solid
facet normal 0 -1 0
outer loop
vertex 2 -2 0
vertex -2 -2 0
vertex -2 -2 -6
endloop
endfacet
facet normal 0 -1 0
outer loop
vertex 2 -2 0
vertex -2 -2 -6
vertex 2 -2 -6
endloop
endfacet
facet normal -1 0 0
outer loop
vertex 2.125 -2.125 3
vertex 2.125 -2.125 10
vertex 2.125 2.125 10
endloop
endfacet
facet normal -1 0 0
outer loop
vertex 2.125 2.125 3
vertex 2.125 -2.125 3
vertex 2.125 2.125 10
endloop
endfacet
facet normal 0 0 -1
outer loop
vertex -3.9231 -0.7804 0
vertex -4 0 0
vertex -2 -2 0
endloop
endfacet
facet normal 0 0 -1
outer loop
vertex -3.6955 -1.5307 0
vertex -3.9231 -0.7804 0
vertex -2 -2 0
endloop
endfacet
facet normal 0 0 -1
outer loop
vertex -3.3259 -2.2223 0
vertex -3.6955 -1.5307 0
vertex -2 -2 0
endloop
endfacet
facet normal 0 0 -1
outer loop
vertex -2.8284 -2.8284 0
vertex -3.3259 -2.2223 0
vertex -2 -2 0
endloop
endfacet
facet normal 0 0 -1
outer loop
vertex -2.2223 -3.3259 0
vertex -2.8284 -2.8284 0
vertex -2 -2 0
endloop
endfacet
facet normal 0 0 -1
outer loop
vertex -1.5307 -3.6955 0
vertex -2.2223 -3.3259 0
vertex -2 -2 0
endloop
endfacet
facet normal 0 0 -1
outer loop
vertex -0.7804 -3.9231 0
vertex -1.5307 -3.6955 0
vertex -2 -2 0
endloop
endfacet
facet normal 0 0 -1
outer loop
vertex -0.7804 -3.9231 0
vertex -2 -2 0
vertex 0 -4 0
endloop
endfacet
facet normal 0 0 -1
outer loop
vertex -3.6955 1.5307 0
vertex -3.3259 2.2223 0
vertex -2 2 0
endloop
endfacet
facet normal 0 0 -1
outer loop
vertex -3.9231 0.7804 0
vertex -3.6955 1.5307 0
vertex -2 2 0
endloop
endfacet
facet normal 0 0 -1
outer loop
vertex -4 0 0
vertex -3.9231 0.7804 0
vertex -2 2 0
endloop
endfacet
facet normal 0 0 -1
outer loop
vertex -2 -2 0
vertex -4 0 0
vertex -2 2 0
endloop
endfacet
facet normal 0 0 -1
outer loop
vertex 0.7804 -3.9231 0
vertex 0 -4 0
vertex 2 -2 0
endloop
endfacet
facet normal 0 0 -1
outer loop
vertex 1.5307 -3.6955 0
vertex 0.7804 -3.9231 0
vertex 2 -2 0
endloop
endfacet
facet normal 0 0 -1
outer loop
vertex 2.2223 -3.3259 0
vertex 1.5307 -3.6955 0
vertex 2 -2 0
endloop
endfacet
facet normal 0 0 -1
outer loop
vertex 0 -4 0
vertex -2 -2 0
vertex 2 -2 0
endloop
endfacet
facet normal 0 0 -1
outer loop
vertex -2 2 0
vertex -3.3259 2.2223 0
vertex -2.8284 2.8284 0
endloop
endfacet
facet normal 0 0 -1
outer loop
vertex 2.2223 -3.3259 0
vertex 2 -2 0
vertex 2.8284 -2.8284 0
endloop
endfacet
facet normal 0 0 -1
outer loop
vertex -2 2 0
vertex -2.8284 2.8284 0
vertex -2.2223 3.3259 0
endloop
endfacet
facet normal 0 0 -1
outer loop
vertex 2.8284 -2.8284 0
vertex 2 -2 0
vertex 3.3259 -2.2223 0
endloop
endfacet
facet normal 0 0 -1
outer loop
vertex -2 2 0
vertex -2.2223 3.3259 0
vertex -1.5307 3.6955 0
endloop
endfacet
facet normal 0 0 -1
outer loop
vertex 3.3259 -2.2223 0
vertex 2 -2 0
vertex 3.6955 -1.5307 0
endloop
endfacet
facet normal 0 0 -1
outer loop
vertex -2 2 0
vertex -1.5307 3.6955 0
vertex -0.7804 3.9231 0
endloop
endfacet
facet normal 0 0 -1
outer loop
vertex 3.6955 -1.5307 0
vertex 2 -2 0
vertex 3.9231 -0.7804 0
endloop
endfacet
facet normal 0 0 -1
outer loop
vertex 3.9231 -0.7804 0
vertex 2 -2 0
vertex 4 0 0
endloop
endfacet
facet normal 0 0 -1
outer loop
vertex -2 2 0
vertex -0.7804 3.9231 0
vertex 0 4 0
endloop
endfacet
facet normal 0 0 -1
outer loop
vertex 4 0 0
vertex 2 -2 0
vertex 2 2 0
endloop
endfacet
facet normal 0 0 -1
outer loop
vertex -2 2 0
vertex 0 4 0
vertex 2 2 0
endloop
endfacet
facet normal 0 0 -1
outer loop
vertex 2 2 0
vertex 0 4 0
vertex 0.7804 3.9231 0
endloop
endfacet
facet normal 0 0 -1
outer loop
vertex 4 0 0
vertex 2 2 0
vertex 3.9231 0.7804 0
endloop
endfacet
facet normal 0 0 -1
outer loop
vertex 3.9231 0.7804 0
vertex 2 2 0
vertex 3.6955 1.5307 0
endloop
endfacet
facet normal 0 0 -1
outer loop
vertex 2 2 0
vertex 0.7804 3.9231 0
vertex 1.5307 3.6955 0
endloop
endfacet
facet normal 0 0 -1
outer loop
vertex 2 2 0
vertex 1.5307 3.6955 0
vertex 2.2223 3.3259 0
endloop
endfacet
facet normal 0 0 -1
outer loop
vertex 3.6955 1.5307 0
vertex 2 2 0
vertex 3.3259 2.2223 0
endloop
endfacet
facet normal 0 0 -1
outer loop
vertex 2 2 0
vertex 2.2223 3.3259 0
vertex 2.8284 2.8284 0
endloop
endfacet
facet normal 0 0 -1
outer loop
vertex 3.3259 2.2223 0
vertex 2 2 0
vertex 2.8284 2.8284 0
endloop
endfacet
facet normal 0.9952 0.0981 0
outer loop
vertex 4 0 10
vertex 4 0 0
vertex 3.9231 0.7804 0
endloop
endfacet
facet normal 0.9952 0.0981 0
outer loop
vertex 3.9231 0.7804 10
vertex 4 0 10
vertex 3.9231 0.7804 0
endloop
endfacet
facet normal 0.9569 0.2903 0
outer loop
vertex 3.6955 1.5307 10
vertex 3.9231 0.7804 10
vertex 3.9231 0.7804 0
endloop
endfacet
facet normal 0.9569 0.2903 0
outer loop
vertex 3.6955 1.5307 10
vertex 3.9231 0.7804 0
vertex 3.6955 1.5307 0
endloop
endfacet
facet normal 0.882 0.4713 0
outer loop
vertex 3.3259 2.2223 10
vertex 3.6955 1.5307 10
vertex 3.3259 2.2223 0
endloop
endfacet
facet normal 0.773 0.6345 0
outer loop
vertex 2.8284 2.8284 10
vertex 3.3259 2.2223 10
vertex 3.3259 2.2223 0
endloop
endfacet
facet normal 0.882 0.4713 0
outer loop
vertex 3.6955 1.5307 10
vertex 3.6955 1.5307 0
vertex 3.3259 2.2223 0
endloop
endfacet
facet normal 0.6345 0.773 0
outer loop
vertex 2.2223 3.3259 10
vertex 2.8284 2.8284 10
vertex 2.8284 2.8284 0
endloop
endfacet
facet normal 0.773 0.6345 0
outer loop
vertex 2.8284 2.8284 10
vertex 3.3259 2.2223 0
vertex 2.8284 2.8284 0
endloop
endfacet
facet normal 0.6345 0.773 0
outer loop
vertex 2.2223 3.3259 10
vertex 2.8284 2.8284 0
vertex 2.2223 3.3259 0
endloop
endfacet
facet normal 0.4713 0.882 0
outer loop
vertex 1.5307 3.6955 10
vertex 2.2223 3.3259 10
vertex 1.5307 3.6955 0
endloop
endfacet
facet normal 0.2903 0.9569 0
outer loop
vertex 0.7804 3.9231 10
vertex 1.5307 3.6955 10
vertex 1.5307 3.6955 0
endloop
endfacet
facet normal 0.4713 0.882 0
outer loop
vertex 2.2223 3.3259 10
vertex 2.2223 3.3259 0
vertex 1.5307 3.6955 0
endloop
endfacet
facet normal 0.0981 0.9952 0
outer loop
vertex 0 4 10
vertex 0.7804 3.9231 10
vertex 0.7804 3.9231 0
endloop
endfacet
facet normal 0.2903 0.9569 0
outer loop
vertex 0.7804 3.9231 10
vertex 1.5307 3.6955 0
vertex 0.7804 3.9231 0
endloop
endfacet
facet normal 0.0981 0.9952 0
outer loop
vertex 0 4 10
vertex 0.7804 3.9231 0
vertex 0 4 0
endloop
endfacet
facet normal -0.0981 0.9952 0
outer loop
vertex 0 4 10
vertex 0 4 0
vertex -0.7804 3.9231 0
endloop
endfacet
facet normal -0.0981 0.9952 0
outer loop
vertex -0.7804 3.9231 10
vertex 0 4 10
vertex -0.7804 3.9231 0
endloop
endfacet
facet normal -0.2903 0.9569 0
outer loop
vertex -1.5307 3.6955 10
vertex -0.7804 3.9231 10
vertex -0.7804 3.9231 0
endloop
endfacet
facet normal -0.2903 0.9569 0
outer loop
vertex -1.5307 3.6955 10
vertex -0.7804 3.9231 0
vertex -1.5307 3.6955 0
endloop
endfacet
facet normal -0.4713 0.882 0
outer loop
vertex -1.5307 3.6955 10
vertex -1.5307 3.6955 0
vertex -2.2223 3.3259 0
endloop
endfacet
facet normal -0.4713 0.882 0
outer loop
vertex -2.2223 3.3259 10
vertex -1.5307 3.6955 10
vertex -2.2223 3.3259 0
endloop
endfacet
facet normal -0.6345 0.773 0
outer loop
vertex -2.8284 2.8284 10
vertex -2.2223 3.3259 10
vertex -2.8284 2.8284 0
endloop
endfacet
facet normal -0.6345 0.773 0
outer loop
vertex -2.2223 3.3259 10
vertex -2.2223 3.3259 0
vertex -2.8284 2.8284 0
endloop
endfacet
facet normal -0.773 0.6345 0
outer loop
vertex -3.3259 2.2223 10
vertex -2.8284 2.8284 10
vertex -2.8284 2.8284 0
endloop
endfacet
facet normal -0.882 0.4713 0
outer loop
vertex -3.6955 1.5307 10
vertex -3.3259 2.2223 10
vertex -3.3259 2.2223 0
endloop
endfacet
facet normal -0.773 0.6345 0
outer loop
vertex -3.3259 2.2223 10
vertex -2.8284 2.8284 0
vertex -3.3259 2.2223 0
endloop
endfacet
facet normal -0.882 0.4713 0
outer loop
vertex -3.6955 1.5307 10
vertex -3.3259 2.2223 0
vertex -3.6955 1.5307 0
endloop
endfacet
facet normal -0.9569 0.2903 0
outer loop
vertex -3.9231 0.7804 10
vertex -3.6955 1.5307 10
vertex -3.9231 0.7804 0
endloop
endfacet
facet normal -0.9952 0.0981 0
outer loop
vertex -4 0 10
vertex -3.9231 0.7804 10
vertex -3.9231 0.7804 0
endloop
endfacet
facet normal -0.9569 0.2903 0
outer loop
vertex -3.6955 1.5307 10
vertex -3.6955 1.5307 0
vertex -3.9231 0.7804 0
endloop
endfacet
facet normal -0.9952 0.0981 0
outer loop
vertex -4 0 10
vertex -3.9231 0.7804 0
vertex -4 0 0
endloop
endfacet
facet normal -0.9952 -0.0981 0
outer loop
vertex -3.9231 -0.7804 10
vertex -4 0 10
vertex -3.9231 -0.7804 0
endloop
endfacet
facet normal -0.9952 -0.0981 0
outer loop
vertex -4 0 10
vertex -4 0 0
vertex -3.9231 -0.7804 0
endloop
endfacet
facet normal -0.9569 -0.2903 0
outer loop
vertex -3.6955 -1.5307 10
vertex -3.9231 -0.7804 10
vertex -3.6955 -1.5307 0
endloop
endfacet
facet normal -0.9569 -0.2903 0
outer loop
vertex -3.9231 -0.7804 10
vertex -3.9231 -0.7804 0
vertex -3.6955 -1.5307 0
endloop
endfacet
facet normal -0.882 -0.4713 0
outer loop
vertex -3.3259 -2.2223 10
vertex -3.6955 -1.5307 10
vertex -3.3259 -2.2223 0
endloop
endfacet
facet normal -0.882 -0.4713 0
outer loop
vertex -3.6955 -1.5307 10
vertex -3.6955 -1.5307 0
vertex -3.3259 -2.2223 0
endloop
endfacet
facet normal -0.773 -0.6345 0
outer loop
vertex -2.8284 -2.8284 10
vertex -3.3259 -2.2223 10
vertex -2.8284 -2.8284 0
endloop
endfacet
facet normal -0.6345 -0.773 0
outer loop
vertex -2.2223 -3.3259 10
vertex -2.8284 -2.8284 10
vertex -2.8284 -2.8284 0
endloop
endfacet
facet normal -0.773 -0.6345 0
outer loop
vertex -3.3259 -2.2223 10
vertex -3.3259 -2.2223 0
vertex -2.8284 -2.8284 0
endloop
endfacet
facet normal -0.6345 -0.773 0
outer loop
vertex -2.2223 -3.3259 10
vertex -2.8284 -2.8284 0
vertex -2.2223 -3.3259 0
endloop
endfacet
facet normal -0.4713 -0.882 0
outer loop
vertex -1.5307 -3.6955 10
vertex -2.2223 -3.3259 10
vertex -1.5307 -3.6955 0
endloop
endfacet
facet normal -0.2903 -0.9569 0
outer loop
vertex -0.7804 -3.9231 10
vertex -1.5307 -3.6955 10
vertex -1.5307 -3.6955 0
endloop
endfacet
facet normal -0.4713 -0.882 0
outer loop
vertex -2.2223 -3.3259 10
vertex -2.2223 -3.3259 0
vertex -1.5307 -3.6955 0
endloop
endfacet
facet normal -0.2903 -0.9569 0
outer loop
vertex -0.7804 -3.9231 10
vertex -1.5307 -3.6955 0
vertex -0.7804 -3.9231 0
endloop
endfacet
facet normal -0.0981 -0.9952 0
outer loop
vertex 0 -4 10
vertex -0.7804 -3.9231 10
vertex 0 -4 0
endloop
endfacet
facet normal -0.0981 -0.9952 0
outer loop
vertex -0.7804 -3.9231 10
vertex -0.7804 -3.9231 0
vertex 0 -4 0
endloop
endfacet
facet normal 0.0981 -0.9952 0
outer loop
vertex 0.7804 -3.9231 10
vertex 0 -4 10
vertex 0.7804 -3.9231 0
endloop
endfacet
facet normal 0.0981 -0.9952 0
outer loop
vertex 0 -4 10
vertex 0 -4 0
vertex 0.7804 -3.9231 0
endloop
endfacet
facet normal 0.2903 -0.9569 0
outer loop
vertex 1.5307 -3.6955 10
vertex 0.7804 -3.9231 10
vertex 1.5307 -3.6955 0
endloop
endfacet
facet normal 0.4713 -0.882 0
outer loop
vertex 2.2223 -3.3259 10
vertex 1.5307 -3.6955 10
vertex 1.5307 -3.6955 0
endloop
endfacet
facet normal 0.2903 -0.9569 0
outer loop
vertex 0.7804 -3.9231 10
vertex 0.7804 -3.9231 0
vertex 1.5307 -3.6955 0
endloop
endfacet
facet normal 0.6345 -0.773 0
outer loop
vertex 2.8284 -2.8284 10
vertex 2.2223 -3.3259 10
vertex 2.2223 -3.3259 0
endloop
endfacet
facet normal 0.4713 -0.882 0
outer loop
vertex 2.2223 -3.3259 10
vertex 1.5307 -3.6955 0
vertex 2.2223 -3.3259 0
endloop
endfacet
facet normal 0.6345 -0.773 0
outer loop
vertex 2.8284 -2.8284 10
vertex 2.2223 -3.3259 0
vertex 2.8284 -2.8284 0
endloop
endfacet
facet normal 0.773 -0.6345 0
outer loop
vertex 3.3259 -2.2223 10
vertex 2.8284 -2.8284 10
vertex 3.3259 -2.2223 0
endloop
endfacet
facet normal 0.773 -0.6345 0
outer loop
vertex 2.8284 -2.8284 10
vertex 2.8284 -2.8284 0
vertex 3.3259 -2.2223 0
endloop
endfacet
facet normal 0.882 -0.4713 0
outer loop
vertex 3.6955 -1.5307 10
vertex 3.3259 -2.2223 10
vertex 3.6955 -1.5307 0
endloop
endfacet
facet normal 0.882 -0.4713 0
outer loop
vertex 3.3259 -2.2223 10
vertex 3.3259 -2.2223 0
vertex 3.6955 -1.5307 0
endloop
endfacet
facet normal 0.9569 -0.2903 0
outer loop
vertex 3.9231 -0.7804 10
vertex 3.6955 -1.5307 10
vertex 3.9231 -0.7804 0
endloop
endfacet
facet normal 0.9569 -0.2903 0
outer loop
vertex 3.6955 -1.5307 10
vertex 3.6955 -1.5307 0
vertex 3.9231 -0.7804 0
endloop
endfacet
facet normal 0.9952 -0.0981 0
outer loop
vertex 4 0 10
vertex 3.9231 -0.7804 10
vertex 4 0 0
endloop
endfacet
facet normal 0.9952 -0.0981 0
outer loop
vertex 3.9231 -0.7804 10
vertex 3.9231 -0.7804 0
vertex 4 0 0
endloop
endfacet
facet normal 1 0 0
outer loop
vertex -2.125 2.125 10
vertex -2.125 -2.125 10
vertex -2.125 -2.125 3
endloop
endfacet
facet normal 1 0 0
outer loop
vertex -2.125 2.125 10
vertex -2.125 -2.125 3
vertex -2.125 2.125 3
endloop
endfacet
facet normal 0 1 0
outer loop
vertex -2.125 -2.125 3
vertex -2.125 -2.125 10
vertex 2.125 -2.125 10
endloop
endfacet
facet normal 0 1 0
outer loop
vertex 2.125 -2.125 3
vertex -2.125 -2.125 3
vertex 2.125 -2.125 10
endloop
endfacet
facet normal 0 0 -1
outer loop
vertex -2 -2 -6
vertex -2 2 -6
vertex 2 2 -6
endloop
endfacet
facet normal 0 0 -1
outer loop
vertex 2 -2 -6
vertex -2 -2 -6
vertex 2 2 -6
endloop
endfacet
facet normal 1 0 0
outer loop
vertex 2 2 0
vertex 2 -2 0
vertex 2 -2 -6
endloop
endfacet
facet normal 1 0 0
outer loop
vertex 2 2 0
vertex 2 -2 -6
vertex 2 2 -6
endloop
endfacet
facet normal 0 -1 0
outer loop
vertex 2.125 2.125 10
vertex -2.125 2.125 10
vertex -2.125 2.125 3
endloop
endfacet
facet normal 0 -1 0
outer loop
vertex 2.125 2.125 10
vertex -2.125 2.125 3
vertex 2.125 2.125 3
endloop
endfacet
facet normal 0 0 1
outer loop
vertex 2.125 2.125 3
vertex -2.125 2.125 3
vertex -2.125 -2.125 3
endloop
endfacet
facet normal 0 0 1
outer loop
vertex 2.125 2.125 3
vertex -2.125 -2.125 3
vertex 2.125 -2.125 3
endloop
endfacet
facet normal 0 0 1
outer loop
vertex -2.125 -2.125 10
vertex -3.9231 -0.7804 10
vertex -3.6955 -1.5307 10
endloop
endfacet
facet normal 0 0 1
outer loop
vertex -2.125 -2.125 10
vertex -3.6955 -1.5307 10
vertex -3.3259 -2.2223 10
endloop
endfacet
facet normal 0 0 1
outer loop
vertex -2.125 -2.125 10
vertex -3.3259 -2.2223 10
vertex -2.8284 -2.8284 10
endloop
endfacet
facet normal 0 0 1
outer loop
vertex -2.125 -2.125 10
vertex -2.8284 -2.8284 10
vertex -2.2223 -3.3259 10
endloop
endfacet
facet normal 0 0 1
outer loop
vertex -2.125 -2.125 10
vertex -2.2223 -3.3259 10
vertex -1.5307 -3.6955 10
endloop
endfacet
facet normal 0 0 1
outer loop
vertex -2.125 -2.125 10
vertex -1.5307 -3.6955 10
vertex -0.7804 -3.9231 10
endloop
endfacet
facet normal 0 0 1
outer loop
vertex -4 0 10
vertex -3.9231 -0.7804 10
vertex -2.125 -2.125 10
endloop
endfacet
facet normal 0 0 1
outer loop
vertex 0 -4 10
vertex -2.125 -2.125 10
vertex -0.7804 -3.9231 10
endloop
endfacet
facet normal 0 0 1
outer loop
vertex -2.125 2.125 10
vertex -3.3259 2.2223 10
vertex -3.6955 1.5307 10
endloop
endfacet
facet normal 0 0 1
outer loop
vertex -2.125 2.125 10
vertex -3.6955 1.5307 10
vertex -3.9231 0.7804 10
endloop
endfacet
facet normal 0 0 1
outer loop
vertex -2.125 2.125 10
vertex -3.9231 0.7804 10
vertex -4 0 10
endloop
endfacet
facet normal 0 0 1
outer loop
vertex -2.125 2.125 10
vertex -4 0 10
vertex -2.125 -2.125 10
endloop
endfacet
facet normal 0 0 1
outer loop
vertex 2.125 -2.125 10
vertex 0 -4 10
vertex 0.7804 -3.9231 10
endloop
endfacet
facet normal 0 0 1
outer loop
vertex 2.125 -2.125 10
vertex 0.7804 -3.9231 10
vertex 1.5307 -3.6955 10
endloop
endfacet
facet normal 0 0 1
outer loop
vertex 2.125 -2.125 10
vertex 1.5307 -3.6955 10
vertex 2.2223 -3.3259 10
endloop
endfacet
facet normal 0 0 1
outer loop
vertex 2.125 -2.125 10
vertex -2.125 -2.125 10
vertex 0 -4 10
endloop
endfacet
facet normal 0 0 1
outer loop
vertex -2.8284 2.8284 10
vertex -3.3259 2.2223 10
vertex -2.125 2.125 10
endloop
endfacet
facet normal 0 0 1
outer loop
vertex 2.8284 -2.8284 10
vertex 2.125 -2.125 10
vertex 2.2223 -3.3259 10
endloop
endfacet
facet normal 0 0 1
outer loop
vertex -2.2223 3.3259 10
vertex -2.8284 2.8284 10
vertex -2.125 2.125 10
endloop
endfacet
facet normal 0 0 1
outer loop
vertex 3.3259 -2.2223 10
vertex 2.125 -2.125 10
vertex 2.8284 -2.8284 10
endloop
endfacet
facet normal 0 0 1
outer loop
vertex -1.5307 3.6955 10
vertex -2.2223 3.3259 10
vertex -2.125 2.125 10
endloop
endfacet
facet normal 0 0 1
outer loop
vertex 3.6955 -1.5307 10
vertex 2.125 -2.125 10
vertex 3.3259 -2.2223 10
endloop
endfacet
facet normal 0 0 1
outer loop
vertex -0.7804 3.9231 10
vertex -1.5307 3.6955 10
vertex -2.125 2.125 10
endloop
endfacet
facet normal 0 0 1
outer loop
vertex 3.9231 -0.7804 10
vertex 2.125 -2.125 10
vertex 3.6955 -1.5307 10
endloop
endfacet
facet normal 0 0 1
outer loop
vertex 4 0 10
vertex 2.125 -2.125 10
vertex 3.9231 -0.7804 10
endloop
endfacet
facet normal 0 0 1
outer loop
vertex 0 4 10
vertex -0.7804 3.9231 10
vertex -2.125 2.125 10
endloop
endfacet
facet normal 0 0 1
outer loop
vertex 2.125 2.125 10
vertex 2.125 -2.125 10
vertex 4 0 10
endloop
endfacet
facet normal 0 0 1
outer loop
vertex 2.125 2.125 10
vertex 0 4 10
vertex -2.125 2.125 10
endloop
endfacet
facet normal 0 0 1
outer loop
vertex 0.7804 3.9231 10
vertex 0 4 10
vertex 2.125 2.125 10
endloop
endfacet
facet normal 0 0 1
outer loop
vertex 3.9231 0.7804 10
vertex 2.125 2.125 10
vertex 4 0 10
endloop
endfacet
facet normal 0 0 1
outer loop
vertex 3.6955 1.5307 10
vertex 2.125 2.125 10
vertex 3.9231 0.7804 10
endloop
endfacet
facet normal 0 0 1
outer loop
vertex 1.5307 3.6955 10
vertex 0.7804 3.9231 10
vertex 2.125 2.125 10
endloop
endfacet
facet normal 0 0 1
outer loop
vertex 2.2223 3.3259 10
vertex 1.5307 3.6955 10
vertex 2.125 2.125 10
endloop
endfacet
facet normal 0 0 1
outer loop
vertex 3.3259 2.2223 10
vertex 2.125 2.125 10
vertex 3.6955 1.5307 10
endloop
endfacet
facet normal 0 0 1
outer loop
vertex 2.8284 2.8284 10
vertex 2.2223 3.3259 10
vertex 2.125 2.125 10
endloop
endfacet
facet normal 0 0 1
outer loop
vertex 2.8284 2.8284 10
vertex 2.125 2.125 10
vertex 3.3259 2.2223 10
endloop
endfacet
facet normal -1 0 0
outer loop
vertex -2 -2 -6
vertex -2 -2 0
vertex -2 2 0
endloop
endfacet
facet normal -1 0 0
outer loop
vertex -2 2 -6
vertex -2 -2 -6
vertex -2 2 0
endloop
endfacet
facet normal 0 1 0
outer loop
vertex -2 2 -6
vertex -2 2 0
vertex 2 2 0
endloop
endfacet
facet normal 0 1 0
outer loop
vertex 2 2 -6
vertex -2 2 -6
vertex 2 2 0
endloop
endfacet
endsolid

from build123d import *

# Parameters (mm, degrees)
F0_R     = 4
F0_W     = 4
F0_H     = 4
F1_DEPTH = 10
F2_W     = 4.25
F2_H     = 4.25
F3_DEPTH = 7
F4_DEPTH = 6


with BuildPart() as f1:
    # F0 (on Top) → F1 (new body)
    with BuildSketch(Plane.XY):
        Circle(F0_R)
        Rectangle(F0_W, F0_H, mode=Mode.SUBTRACT)
        Rectangle(F0_W, F0_H)
    extrude(amount=F1_DEPTH)

    # F2 (on face) → F3 (cut)
    with BuildSketch(Plane.XY.offset(10)):
        Rectangle(F2_W, F2_H)
    extrude(amount=-F3_DEPTH, mode=Mode.SUBTRACT)

    # F0 (on Top) → F4 (join)
    with BuildSketch(Plane.XY):
        Rectangle(F0_W, F0_H)
    extrude(amount=-F4_DEPTH)


solid = f1.part
